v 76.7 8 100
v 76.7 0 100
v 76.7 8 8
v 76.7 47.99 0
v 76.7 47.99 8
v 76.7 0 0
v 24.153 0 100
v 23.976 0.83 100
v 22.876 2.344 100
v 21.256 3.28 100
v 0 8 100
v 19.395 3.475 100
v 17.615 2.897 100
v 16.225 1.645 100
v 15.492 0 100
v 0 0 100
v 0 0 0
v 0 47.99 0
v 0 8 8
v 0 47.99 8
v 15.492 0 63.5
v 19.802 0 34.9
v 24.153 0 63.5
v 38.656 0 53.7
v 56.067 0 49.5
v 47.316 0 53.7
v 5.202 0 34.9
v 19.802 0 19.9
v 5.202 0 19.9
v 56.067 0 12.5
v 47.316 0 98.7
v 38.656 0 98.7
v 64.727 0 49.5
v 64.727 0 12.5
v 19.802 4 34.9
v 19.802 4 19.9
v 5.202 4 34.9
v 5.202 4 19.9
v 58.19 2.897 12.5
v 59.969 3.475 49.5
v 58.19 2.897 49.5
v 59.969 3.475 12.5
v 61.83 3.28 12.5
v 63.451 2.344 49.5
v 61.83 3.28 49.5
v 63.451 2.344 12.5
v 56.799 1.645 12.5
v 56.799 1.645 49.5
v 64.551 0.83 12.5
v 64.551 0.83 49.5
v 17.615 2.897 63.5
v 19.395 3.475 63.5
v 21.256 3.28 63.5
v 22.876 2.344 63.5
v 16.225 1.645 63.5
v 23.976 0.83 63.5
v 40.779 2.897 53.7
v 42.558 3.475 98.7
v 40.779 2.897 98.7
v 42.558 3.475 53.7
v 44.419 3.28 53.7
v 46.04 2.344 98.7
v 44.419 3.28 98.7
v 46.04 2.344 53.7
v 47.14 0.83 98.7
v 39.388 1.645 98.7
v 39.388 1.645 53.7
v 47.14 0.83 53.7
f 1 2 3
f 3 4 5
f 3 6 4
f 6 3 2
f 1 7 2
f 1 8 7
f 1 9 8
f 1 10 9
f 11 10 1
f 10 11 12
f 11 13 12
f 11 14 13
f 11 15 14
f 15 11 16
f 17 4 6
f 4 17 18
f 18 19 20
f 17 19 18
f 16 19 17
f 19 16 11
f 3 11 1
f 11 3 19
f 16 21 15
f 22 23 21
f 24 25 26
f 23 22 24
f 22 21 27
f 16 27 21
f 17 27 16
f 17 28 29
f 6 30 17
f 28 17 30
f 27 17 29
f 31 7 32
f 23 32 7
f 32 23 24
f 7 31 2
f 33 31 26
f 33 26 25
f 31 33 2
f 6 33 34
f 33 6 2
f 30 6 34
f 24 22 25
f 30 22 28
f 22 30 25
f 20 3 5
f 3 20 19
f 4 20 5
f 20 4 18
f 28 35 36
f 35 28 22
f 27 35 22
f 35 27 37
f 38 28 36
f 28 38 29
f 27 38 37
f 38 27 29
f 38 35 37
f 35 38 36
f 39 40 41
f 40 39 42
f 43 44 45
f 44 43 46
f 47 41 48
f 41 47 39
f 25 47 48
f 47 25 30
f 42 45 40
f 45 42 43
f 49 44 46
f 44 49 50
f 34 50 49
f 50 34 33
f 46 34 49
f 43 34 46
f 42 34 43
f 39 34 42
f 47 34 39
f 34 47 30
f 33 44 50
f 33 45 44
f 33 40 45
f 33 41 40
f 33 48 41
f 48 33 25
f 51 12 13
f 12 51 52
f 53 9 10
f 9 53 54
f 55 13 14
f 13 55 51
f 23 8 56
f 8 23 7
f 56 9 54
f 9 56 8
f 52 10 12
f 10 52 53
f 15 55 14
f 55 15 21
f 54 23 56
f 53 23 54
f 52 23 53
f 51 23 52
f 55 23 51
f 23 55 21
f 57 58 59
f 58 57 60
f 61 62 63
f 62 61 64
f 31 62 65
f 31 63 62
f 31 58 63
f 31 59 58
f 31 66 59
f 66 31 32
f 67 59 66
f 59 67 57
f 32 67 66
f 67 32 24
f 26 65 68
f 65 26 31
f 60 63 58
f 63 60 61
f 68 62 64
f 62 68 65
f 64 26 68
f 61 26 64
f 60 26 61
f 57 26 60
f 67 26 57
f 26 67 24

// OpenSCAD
/* doodle-meta {"version":1,"parameters":{"width":{"label":"Overall width","description":"Changes the body width","unit":"mm","feature":"body_width"},"depth":{"label":"Overall depth","description":"Changes the body depth","unit":"mm","feature":"body_depth"},"height":{"label":"Overall height","description":"Changes the body height","unit":"mm","feature":"body_height"},"backplate_thickness":{"label":"Backplate thickness","description":"Thickness of the vertical backplate","unit":"mm","feature":"backplate"},"base_thickness":{"label":"Base thickness","description":"Thickness of the horizontal base flange","unit":"mm","feature":"base"},"cutout_rect_w":{"label":"Rect cutout width","description":"Width of the top-left rectangular cutout","unit":"mm","feature":"cutout_rect"},"cutout_rect_h":{"label":"Rect cutout height","description":"Height of the top-left rectangular cutout","unit":"mm","feature":"cutout_rect"},"cutout_slot_w":{"label":"Slot width","description":"Width of the vertical slot cutouts","unit":"mm","feature":"cutout_slot"},"cutout_slot_h_top":{"label":"Top slot height","description":"Height of the top-middle slot cutout","unit":"mm","feature":"cutout_slot"},"cutout_slot_h_bot":{"label":"Bottom slot height","description":"Height of the bottom slot cutouts","unit":"mm","feature":"cutout_slot"}},"features":{"body_width":{"kind":"dimension","axis":"x","label":"Overall width"},"body_depth":{"kind":"dimension","axis":"y","label":"Overall depth"},"body_height":{"kind":"dimension","axis":"z","label":"Overall height"},"backplate":{"kind":"region","label":"Vertical backplate","min":[0,0,0],"max":[{"parameter":"width"},{"parameter":"backplate_thickness"},{"parameter":"height"}]},"base":{"kind":"region","label":"Horizontal base","min":[0,0,0],"max":[{"parameter":"width"},{"parameter":"depth"},{"parameter":"base_thickness"}]},"cutout_rect":{"kind":"region","label":"Top-left rectangle cutout","min":[{"parameter":"width","scale":0.063,"offset":0},{"parameter":"backplate_thickness","offset":-1},{"parameter":"height","scale":0.214,"offset":0}],"max":[{"parameter":"width","scale":0.263,"offset":0},{"parameter":"backplate_thickness","offset":1},{"parameter":"height","scale":0.364,"offset":0}]},"cutout_slot":{"kind":"region","label":"Slot cutouts","min":[{"parameter":"width","scale":0.113,"offset":0},{"parameter":"backplate_thickness","offset":-1},{"parameter":"height","scale":0.088,"offset":0}],"max":[{"parameter":"width","scale":0.838,"offset":0},{"parameter":"backplate_thickness","offset":1},{"parameter":"height","scale":0.866,"offset":0}]}}} */

// --- Parameters ---
width = 76.7;
depth = 47.99;
height = 100.0;
backplate_thickness = 8.0;
base_thickness = 8.0;

// Cutout dimensions (derived from normalized view measurements)
cutout_rect_w = 14.6;
cutout_rect_h = 15.0;
cutout_slot_w = 9.0;
cutout_slot_h_top = 36.0;
cutout_slot_h_bot = 44.0;

// Cutout centers (derived from evaluation missing centroids)
// Front view mapping: X = u * width, Z = (1 - v) * height
rect_cx = 0.163 * width;
rect_cz = (1.0 - 0.726) * height;

slot_top_cx = 0.788 * width;
slot_top_cz = (1.0 - 0.69) * height;

slot_bl_cx = 0.259 * width;
slot_bl_cz = (1.0 - 0.14) * height;

slot_br_cx = 0.561 * width;
slot_br_cz = (1.0 - 0.238) * height;

// --- Modules ---
// Vertical slot (stadium) centered at (cx, cz) in XZ plane, cutting through Y (the backplate).
module slot_cutter(w, h, cx, cz) {
    r = w / 2;
    straight = h - w;
    translate([cx, -1, cz])
        hull() {
            translate([0, 0,  straight/2]) cylinder(r=r, h=backplate_thickness+2, center=true);
            translate([0, 0, -straight/2]) cylinder(r=r, h=backplate_thickness+2, center=true);
        }
}

// Rectangle centered at (cx, cz) in XZ plane, cutting through Y (the backplate).
module rect_cutter(w, h, cx, cz) {
    translate([cx, -1, cz])
        cube([w, backplate_thickness + 2, h], center=true);
}

// --- Main Design ---
difference() {
    // 1. Positive Body: L-Shape
    union() {
        // Vertical Backplate (Back side, full height)
        cube([width, backplate_thickness, height]);
        // Horizontal Base (Bottom, extending forward)
        cube([width, depth, base_thickness]);
    }

    // 2. Subtractive Cutouts (Through the backplate, along Y)
    rect_cutter(cutout_rect_w, cutout_rect_h, rect_cx, rect_cz);
    slot_cutter(cutout_slot_w, cutout_slot_h_top, slot_top_cx, slot_top_cz);
    slot_cutter(cutout_slot_w, cutout_slot_h_bot, slot_bl_cx, slot_bl_cz);
    slot_cutter(cutout_slot_w, cutout_slot_h_bot, slot_br_cx, slot_br_cz);
}
